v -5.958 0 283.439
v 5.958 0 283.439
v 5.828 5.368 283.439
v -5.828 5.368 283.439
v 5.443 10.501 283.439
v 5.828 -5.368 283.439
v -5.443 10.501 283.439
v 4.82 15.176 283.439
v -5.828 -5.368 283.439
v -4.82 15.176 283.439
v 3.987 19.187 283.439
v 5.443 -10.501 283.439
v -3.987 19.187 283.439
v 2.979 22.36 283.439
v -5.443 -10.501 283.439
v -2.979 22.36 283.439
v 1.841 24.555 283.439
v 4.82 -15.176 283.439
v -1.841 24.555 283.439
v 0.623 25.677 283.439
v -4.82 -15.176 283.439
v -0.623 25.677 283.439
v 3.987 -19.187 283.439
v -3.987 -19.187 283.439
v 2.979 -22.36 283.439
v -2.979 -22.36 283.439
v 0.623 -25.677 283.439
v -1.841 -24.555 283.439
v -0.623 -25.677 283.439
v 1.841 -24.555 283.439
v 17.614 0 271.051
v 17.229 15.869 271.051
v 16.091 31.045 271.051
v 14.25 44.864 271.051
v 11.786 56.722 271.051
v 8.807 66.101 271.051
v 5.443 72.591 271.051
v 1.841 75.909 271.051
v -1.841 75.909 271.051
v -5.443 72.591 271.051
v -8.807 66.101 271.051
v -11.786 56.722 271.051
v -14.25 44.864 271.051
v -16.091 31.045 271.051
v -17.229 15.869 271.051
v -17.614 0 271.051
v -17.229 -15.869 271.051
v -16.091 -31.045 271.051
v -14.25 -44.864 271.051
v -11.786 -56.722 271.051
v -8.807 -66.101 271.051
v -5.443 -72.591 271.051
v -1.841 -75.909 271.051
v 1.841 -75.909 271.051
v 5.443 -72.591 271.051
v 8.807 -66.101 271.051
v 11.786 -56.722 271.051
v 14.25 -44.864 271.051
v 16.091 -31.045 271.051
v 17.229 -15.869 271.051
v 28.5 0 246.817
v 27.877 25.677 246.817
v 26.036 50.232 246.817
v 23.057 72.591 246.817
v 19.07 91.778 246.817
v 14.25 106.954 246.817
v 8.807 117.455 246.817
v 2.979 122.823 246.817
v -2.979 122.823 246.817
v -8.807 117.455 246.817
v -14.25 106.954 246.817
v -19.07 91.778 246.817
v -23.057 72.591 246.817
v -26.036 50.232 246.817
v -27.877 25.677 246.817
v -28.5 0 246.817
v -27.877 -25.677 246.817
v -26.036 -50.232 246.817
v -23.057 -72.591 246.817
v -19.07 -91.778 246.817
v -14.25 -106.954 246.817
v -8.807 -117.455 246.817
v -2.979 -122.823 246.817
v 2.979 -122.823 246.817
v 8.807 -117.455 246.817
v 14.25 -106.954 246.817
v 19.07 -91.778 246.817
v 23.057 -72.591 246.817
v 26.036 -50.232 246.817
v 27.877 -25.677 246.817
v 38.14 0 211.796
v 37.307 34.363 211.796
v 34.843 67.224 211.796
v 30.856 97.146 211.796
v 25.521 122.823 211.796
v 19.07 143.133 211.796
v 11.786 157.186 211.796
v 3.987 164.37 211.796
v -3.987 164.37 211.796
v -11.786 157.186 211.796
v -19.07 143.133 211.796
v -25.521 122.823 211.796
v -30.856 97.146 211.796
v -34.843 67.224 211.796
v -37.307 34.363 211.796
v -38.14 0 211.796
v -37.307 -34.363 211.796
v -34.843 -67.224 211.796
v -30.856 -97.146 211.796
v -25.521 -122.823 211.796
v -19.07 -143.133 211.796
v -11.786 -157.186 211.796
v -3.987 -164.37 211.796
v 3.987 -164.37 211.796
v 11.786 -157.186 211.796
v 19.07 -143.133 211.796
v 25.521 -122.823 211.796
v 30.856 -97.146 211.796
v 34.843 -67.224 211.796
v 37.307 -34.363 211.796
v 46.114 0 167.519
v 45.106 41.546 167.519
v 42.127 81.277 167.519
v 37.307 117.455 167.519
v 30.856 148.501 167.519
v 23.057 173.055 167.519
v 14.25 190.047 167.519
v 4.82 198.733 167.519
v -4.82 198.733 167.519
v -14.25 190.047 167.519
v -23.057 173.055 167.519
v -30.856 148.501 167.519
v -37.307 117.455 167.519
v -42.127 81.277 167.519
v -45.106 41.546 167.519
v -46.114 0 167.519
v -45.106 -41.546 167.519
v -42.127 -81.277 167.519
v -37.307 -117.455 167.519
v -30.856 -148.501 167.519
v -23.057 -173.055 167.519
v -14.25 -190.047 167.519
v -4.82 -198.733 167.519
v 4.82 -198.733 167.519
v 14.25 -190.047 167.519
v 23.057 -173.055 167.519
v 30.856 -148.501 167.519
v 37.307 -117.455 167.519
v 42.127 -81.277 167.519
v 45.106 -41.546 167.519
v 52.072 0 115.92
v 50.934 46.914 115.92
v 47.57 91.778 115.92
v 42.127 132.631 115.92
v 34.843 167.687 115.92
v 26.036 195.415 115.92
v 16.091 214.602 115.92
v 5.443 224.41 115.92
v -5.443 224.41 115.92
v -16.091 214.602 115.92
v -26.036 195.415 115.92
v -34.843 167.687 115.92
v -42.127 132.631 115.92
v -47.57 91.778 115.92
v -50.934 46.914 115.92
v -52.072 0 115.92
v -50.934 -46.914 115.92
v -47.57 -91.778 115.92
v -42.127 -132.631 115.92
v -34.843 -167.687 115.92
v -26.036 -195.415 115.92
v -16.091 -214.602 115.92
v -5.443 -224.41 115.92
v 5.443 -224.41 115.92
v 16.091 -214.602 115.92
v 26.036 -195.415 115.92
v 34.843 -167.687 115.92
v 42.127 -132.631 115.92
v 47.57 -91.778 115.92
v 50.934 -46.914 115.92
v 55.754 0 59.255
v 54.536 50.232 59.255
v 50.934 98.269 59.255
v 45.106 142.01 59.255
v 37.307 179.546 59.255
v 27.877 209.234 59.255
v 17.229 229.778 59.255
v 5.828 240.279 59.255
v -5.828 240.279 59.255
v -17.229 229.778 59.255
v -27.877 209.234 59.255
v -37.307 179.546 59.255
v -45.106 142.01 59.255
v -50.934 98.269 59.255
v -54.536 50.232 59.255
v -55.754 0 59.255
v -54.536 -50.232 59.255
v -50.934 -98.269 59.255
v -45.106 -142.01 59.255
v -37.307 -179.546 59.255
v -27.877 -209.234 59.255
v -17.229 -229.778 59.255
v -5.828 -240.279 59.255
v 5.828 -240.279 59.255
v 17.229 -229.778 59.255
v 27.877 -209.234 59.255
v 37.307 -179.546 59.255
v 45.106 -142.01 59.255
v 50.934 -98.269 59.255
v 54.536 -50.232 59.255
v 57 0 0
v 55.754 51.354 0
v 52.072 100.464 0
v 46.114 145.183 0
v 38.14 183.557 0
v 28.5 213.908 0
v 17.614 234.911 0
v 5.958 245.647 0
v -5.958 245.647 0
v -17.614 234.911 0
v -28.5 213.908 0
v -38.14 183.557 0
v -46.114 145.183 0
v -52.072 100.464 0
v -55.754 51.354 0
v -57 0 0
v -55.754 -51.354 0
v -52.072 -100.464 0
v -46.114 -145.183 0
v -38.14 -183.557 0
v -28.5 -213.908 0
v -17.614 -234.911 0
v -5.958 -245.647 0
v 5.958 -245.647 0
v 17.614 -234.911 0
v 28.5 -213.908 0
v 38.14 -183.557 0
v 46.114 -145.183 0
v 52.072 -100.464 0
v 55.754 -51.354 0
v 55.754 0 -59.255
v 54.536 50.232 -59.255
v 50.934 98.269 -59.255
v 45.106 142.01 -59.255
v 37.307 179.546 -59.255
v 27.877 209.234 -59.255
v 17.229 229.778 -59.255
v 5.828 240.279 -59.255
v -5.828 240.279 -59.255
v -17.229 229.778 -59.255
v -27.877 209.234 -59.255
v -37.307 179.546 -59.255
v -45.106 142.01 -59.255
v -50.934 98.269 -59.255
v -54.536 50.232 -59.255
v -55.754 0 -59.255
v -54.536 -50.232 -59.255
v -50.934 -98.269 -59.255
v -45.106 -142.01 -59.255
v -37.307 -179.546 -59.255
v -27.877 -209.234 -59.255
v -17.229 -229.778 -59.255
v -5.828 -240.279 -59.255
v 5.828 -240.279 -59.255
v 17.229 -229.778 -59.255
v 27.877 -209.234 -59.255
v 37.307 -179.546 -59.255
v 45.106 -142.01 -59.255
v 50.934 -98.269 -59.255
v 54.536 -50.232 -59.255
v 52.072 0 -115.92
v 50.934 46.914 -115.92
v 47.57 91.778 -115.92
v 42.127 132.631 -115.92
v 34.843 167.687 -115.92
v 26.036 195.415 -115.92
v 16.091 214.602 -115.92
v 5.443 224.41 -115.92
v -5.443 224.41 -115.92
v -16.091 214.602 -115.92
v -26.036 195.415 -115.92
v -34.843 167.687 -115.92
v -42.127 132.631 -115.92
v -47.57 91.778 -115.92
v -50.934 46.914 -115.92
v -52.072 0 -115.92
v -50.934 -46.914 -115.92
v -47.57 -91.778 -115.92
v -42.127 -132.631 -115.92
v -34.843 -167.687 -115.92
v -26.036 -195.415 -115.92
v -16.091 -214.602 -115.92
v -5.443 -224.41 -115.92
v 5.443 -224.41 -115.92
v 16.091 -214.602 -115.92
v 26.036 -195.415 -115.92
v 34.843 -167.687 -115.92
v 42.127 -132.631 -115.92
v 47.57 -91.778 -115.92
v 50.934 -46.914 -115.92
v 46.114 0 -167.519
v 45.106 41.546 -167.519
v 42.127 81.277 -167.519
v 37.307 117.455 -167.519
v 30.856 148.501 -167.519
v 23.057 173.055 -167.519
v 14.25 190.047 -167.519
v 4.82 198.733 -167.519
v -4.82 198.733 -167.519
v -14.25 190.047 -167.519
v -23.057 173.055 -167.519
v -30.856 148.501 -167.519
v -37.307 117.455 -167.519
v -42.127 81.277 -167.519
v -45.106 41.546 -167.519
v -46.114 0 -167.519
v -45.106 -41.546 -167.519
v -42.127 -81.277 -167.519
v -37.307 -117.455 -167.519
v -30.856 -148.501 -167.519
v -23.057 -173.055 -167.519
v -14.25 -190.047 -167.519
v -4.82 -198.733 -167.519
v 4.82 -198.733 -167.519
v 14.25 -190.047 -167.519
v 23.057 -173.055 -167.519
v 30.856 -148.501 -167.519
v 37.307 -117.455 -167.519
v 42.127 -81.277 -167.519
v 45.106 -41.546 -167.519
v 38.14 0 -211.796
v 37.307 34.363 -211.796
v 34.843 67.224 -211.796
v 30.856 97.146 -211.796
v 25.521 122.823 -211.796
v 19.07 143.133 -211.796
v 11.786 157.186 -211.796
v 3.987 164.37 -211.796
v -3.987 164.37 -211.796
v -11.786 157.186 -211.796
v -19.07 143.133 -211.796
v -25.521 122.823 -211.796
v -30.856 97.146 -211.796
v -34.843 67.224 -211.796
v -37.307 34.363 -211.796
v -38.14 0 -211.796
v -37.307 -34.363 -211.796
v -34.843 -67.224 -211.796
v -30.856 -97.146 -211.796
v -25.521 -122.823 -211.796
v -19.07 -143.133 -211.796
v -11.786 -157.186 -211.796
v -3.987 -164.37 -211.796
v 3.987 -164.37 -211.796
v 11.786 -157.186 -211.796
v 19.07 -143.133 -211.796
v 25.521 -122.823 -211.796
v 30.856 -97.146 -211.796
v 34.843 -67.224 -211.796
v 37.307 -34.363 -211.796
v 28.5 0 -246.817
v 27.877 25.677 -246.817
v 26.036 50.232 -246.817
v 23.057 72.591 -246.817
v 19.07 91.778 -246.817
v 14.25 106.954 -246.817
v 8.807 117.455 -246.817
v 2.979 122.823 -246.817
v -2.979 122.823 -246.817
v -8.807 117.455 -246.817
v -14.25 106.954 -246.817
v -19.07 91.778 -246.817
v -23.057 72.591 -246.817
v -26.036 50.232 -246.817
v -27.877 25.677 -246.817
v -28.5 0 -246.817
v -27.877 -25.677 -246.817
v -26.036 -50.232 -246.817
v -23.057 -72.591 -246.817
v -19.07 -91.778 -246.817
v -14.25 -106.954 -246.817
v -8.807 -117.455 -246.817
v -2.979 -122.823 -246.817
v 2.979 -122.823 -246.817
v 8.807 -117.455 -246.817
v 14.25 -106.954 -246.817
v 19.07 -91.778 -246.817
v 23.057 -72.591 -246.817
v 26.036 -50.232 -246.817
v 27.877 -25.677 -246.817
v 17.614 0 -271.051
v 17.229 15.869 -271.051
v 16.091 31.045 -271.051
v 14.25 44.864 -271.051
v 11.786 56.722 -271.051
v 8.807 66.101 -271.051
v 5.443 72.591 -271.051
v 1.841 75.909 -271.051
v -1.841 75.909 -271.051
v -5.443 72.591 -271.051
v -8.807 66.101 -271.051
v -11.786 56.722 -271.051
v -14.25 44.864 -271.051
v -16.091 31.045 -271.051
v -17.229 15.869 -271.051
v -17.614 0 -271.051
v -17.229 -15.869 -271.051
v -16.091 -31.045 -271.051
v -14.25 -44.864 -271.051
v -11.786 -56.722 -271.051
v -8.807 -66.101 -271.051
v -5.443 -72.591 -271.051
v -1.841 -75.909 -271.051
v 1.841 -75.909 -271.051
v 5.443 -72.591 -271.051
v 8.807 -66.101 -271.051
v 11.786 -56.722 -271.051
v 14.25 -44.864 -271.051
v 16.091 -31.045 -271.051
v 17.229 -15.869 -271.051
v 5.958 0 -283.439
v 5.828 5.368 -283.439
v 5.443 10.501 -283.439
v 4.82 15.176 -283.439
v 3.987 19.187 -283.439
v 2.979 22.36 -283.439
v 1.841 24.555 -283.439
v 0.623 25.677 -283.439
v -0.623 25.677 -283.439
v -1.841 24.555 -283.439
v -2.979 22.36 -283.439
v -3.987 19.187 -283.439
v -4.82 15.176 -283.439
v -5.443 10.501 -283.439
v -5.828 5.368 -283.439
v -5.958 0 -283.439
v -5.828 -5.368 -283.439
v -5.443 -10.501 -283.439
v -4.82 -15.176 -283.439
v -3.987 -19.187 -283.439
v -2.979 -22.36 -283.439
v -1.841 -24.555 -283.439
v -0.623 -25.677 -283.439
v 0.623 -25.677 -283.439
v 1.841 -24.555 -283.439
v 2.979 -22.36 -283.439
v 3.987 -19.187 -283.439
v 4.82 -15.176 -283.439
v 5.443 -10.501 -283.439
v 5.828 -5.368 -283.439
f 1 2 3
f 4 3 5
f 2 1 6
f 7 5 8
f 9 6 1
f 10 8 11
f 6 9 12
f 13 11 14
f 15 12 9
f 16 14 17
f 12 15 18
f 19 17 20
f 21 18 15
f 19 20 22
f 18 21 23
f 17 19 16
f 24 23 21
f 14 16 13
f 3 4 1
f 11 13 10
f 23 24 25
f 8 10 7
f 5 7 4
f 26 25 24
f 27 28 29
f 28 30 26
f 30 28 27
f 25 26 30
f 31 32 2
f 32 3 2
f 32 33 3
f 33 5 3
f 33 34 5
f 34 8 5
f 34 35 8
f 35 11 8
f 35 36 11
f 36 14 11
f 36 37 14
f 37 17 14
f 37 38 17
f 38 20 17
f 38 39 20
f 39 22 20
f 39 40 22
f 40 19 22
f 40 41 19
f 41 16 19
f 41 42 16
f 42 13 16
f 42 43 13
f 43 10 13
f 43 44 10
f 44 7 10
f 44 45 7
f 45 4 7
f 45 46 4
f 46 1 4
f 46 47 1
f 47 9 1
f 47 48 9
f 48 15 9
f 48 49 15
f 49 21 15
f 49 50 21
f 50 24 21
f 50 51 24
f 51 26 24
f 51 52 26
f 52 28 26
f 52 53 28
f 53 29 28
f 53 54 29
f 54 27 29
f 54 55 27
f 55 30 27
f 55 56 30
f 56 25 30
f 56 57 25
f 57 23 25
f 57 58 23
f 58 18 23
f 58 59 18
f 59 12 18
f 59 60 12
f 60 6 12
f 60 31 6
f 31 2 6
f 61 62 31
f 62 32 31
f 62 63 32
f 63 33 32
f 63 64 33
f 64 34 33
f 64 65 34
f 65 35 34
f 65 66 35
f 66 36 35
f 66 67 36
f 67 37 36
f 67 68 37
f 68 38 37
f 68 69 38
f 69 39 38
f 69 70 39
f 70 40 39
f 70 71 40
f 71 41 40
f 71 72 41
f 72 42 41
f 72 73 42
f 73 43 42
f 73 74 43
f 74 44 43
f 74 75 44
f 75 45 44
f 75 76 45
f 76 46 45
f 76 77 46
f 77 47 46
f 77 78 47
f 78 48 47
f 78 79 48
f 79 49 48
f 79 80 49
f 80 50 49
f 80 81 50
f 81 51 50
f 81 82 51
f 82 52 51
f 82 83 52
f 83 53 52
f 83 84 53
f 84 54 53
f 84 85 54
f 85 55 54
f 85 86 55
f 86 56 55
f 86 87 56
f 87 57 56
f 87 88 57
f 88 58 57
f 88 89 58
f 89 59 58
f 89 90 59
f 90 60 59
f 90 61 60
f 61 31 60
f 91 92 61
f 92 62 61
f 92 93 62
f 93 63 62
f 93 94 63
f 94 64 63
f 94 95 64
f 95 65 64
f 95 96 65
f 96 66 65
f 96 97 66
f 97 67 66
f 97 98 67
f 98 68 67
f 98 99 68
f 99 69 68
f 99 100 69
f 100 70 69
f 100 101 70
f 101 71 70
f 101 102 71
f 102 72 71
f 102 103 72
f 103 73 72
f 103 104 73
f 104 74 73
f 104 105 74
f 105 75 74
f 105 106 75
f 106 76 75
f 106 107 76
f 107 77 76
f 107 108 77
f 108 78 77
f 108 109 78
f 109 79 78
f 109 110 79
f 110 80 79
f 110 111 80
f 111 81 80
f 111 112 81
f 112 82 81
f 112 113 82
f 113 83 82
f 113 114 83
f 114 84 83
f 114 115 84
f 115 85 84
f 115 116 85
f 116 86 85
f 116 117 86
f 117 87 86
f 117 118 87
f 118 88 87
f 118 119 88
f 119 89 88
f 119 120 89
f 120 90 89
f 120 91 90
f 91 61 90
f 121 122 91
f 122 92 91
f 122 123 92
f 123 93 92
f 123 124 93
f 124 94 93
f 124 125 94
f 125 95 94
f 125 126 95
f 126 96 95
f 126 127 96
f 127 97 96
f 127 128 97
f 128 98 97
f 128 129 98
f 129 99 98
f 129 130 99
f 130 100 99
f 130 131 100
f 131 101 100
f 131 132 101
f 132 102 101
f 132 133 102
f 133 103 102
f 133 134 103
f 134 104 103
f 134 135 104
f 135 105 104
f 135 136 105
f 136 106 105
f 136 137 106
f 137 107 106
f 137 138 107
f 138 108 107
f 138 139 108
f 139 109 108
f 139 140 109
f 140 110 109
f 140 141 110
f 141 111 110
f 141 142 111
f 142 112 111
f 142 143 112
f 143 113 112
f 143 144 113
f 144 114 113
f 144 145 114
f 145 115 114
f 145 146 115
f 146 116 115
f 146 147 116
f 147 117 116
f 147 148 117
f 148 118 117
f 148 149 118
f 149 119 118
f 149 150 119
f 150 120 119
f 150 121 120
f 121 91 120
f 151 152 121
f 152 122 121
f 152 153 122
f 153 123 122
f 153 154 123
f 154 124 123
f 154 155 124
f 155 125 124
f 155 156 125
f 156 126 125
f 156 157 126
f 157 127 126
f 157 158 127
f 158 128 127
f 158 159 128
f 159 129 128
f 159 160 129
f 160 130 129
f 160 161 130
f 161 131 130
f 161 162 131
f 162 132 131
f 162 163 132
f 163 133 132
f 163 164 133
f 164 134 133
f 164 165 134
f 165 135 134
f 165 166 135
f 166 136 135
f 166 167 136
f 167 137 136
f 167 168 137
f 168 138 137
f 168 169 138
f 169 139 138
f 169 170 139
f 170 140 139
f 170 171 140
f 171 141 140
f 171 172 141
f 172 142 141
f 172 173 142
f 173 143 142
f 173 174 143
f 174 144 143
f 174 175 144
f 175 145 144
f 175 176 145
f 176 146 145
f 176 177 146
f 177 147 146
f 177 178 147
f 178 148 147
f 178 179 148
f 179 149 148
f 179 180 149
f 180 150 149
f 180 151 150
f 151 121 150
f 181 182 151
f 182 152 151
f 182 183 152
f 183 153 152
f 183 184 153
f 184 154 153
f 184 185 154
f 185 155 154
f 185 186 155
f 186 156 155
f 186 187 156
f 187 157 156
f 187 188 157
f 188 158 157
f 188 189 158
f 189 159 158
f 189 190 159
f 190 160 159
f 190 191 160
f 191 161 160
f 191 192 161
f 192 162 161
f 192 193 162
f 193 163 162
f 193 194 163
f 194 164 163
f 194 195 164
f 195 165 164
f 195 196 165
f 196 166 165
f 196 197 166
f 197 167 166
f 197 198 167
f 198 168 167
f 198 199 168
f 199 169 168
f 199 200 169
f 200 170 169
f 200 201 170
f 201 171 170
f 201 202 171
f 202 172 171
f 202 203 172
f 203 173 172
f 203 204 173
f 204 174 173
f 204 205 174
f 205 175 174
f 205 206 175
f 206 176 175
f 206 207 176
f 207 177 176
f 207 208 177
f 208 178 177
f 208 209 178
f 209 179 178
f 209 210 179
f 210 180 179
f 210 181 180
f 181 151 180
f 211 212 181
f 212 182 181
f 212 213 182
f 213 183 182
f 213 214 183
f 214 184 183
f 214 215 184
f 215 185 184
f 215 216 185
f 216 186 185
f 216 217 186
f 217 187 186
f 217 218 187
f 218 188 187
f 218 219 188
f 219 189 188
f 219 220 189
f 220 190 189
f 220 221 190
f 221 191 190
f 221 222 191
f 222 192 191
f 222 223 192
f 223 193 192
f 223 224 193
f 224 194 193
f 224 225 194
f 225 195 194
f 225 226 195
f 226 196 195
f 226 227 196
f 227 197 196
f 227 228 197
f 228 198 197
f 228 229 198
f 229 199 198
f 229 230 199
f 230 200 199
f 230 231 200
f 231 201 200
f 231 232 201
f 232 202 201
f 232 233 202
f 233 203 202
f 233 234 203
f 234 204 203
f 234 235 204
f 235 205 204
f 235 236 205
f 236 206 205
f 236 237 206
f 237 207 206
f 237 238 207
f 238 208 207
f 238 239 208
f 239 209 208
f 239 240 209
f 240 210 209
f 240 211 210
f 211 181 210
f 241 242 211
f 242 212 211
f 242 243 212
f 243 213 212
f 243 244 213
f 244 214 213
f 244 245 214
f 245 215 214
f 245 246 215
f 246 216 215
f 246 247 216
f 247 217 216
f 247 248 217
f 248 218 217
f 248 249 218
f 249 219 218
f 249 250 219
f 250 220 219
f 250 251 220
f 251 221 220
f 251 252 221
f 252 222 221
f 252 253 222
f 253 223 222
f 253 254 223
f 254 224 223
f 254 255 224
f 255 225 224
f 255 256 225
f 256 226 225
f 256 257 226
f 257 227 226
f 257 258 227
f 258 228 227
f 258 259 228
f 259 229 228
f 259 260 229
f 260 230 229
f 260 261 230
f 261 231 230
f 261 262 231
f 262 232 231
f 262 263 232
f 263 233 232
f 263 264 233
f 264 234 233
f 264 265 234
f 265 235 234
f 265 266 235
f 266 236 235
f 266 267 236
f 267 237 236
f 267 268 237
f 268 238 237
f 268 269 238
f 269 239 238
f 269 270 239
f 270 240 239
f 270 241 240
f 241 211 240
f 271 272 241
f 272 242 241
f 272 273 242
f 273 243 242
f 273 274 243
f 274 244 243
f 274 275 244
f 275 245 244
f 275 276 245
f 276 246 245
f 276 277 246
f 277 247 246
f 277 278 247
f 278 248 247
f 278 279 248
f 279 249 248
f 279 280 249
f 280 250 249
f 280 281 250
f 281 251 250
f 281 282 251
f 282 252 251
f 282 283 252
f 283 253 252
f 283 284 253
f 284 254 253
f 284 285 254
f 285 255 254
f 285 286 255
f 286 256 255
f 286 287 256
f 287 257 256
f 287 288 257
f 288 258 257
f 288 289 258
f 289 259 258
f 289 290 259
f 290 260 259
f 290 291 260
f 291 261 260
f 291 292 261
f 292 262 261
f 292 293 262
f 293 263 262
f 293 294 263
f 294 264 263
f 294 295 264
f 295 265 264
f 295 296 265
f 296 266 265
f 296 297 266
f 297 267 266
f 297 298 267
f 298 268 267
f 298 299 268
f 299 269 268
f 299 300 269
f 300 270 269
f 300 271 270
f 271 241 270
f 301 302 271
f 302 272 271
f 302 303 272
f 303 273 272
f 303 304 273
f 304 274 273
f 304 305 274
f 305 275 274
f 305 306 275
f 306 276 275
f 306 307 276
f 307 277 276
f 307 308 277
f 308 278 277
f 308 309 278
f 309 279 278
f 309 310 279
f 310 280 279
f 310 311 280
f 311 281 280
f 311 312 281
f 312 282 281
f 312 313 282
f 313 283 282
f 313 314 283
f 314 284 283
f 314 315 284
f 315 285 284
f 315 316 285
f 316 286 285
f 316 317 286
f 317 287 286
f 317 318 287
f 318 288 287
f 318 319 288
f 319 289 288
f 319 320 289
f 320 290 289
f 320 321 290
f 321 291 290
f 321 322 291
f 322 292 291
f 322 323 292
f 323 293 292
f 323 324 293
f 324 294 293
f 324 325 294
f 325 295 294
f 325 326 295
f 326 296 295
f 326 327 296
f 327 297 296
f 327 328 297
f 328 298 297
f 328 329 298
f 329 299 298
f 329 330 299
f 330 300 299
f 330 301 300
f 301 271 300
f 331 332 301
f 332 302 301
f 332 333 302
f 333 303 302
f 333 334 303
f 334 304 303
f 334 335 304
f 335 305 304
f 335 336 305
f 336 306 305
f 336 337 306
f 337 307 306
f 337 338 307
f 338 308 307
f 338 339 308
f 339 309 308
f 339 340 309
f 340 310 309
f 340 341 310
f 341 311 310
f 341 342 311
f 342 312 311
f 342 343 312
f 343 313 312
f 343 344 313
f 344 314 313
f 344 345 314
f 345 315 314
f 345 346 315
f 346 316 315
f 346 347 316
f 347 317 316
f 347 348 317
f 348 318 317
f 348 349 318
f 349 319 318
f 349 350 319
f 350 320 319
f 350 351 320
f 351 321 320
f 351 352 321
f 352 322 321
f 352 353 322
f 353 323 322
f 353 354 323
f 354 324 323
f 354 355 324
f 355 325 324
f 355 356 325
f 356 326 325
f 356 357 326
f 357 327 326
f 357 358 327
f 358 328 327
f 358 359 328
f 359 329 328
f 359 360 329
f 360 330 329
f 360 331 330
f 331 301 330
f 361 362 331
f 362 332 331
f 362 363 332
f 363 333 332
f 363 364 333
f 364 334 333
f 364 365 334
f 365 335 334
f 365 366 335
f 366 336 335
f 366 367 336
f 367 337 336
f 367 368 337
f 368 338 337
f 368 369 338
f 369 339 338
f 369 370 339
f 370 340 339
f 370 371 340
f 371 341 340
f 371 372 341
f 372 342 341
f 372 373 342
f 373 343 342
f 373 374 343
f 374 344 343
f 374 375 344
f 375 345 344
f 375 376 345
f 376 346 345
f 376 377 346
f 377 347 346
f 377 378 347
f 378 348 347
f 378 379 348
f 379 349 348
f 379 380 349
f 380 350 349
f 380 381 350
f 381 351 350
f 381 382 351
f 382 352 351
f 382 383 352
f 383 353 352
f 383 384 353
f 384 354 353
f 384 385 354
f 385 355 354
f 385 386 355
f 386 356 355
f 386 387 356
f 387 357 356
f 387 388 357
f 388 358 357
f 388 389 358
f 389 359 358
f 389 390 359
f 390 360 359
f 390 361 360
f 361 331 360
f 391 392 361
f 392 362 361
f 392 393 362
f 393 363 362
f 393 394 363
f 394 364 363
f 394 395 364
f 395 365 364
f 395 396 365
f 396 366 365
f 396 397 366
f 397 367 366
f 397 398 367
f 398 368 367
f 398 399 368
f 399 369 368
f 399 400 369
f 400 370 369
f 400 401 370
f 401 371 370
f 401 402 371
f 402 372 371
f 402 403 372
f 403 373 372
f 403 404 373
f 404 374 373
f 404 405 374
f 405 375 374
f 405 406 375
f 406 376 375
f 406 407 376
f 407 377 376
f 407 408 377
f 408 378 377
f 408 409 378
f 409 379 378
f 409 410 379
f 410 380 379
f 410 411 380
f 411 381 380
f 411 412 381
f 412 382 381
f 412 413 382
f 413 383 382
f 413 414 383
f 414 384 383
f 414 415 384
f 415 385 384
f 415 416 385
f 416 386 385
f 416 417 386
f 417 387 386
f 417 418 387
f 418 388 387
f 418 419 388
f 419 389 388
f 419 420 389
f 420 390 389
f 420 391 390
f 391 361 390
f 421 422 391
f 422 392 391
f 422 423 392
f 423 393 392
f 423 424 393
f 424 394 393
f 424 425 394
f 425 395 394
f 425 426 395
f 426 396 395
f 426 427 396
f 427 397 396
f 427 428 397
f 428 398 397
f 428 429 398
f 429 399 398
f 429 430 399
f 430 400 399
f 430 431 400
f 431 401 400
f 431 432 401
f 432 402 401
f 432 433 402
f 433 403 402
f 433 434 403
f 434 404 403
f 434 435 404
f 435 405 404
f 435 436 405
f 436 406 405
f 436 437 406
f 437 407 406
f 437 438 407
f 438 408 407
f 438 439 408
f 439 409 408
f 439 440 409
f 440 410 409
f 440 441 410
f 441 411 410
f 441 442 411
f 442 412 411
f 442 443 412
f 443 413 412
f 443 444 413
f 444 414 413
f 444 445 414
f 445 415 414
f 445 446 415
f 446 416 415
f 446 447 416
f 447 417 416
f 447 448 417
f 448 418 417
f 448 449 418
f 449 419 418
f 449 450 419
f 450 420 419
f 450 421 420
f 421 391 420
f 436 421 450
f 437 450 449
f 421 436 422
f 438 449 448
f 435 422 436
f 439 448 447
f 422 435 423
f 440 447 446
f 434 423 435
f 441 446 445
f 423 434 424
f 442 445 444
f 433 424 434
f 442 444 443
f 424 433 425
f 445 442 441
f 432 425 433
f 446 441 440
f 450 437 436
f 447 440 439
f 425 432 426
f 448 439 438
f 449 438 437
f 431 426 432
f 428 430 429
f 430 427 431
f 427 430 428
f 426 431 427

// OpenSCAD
// Generated by SolidPython 1.0.1 on 2020-07-29 00:46:45


scale(v = [3, 13, 15]) {
	sphere(r = 19);
}
/***********************************************
*********      SolidPython code:      **********
************************************************
 
# import packages: SolidPython
from solid import *
from solid.utils import *
from itertools import chain, combinations, permutations


class Resize:

    def __init__(self, scad_file):
        self.scad_file = scad_file
        #self.scad_file = import_scad(scad_file)
        # cone/cylinder param:
        self.r1 = 0
        self.r2 = 0
        self.h = 0
        # rectangular prism param:
        self.w = 0
        self.l = 0
        # ellipse param:
        self.r = 0

    # import OpenScad code (file name corresponds to shape)


    # classify shape + parameters
    def assign(self, param1, param2, param3):
        if self.scad_file == 'cone.scad':
            self.r1 = param1
            self.r2 = param2
            self.h = param3
        elif self.scad_file == 'cylinder.scad':
            self.r1 = param1
            self.r2 = param2
            self.h = param3
        elif self.scad_file == 'rectangularPrism.scad':
            self.h = param1
            self.l = param2
            self.w = param3
        else:
            self.r = param1
            self.h = param2

    # resize parameters
    def iterate(self):
        x = range(3, 20, 2)
        i = 1
        if self.scad_file == 'cone.scad':
            tempList = list(permutations(x, 2))
            for temp in tempList:
                param1 = temp[0]
                param2 = temp[1]
                filepath = 'produced_scad_files/' + 'cone' + str(param1) + '_' + str(param2) + '_' + '.scad'
                scad_render_to_file(cylinder(h=param1, r1=param2, r2=0), filepath)

        elif self.scad_file == 'cylinder.scad':
            tempList = list(permutations(x, 3))
            for temp in tempList:
                param1 = temp[0]
                param2 = temp[1]
                filepath = 'produced_scad_files/' + 'cylinder' + str(param1) + '_' + str(param2) + '_' + '.scad'
                scad_render_to_file(cylinder(h=param1, r1=param2, r2=param2), filepath)

        elif self.scad_file == 'rectangularPrism.scad':
            tempList = list(permutations(x, 3))
            for temp in tempList:
                param1 = temp[0]
                param2 = temp[1]
                param3 = temp[2]
                filepath = 'produced_scad_files/' + 'rectangularPrism' + str(param1) + '_' + str(param2) + '_' + str(
                    param3) + '.scad'
                scad_render_to_file(cube(size=(param1, param2, param3)), filepath)

        elif self.scad_file == 'ellipse.scad':
            tempList = list(permutations(x, 4))
            for temp in tempList:
                param1 = temp[0]
                param2 = temp[1]
                param3 = temp[2]
                param4 = temp[3]
                filepath = 'produced_scad_files/' + 'ellipse' + str(param1) + '_' + str(param2) + '_' + str(param3) + '_' + str(param4) + '.scad'
                scad_render_to_file(scale([param1, param2, param3])(sphere(r=param4)), filepath)

    def render_to_scadfile(self):
        scad_render_to_file(scad, 'example.scad') 
 
************************************************/
